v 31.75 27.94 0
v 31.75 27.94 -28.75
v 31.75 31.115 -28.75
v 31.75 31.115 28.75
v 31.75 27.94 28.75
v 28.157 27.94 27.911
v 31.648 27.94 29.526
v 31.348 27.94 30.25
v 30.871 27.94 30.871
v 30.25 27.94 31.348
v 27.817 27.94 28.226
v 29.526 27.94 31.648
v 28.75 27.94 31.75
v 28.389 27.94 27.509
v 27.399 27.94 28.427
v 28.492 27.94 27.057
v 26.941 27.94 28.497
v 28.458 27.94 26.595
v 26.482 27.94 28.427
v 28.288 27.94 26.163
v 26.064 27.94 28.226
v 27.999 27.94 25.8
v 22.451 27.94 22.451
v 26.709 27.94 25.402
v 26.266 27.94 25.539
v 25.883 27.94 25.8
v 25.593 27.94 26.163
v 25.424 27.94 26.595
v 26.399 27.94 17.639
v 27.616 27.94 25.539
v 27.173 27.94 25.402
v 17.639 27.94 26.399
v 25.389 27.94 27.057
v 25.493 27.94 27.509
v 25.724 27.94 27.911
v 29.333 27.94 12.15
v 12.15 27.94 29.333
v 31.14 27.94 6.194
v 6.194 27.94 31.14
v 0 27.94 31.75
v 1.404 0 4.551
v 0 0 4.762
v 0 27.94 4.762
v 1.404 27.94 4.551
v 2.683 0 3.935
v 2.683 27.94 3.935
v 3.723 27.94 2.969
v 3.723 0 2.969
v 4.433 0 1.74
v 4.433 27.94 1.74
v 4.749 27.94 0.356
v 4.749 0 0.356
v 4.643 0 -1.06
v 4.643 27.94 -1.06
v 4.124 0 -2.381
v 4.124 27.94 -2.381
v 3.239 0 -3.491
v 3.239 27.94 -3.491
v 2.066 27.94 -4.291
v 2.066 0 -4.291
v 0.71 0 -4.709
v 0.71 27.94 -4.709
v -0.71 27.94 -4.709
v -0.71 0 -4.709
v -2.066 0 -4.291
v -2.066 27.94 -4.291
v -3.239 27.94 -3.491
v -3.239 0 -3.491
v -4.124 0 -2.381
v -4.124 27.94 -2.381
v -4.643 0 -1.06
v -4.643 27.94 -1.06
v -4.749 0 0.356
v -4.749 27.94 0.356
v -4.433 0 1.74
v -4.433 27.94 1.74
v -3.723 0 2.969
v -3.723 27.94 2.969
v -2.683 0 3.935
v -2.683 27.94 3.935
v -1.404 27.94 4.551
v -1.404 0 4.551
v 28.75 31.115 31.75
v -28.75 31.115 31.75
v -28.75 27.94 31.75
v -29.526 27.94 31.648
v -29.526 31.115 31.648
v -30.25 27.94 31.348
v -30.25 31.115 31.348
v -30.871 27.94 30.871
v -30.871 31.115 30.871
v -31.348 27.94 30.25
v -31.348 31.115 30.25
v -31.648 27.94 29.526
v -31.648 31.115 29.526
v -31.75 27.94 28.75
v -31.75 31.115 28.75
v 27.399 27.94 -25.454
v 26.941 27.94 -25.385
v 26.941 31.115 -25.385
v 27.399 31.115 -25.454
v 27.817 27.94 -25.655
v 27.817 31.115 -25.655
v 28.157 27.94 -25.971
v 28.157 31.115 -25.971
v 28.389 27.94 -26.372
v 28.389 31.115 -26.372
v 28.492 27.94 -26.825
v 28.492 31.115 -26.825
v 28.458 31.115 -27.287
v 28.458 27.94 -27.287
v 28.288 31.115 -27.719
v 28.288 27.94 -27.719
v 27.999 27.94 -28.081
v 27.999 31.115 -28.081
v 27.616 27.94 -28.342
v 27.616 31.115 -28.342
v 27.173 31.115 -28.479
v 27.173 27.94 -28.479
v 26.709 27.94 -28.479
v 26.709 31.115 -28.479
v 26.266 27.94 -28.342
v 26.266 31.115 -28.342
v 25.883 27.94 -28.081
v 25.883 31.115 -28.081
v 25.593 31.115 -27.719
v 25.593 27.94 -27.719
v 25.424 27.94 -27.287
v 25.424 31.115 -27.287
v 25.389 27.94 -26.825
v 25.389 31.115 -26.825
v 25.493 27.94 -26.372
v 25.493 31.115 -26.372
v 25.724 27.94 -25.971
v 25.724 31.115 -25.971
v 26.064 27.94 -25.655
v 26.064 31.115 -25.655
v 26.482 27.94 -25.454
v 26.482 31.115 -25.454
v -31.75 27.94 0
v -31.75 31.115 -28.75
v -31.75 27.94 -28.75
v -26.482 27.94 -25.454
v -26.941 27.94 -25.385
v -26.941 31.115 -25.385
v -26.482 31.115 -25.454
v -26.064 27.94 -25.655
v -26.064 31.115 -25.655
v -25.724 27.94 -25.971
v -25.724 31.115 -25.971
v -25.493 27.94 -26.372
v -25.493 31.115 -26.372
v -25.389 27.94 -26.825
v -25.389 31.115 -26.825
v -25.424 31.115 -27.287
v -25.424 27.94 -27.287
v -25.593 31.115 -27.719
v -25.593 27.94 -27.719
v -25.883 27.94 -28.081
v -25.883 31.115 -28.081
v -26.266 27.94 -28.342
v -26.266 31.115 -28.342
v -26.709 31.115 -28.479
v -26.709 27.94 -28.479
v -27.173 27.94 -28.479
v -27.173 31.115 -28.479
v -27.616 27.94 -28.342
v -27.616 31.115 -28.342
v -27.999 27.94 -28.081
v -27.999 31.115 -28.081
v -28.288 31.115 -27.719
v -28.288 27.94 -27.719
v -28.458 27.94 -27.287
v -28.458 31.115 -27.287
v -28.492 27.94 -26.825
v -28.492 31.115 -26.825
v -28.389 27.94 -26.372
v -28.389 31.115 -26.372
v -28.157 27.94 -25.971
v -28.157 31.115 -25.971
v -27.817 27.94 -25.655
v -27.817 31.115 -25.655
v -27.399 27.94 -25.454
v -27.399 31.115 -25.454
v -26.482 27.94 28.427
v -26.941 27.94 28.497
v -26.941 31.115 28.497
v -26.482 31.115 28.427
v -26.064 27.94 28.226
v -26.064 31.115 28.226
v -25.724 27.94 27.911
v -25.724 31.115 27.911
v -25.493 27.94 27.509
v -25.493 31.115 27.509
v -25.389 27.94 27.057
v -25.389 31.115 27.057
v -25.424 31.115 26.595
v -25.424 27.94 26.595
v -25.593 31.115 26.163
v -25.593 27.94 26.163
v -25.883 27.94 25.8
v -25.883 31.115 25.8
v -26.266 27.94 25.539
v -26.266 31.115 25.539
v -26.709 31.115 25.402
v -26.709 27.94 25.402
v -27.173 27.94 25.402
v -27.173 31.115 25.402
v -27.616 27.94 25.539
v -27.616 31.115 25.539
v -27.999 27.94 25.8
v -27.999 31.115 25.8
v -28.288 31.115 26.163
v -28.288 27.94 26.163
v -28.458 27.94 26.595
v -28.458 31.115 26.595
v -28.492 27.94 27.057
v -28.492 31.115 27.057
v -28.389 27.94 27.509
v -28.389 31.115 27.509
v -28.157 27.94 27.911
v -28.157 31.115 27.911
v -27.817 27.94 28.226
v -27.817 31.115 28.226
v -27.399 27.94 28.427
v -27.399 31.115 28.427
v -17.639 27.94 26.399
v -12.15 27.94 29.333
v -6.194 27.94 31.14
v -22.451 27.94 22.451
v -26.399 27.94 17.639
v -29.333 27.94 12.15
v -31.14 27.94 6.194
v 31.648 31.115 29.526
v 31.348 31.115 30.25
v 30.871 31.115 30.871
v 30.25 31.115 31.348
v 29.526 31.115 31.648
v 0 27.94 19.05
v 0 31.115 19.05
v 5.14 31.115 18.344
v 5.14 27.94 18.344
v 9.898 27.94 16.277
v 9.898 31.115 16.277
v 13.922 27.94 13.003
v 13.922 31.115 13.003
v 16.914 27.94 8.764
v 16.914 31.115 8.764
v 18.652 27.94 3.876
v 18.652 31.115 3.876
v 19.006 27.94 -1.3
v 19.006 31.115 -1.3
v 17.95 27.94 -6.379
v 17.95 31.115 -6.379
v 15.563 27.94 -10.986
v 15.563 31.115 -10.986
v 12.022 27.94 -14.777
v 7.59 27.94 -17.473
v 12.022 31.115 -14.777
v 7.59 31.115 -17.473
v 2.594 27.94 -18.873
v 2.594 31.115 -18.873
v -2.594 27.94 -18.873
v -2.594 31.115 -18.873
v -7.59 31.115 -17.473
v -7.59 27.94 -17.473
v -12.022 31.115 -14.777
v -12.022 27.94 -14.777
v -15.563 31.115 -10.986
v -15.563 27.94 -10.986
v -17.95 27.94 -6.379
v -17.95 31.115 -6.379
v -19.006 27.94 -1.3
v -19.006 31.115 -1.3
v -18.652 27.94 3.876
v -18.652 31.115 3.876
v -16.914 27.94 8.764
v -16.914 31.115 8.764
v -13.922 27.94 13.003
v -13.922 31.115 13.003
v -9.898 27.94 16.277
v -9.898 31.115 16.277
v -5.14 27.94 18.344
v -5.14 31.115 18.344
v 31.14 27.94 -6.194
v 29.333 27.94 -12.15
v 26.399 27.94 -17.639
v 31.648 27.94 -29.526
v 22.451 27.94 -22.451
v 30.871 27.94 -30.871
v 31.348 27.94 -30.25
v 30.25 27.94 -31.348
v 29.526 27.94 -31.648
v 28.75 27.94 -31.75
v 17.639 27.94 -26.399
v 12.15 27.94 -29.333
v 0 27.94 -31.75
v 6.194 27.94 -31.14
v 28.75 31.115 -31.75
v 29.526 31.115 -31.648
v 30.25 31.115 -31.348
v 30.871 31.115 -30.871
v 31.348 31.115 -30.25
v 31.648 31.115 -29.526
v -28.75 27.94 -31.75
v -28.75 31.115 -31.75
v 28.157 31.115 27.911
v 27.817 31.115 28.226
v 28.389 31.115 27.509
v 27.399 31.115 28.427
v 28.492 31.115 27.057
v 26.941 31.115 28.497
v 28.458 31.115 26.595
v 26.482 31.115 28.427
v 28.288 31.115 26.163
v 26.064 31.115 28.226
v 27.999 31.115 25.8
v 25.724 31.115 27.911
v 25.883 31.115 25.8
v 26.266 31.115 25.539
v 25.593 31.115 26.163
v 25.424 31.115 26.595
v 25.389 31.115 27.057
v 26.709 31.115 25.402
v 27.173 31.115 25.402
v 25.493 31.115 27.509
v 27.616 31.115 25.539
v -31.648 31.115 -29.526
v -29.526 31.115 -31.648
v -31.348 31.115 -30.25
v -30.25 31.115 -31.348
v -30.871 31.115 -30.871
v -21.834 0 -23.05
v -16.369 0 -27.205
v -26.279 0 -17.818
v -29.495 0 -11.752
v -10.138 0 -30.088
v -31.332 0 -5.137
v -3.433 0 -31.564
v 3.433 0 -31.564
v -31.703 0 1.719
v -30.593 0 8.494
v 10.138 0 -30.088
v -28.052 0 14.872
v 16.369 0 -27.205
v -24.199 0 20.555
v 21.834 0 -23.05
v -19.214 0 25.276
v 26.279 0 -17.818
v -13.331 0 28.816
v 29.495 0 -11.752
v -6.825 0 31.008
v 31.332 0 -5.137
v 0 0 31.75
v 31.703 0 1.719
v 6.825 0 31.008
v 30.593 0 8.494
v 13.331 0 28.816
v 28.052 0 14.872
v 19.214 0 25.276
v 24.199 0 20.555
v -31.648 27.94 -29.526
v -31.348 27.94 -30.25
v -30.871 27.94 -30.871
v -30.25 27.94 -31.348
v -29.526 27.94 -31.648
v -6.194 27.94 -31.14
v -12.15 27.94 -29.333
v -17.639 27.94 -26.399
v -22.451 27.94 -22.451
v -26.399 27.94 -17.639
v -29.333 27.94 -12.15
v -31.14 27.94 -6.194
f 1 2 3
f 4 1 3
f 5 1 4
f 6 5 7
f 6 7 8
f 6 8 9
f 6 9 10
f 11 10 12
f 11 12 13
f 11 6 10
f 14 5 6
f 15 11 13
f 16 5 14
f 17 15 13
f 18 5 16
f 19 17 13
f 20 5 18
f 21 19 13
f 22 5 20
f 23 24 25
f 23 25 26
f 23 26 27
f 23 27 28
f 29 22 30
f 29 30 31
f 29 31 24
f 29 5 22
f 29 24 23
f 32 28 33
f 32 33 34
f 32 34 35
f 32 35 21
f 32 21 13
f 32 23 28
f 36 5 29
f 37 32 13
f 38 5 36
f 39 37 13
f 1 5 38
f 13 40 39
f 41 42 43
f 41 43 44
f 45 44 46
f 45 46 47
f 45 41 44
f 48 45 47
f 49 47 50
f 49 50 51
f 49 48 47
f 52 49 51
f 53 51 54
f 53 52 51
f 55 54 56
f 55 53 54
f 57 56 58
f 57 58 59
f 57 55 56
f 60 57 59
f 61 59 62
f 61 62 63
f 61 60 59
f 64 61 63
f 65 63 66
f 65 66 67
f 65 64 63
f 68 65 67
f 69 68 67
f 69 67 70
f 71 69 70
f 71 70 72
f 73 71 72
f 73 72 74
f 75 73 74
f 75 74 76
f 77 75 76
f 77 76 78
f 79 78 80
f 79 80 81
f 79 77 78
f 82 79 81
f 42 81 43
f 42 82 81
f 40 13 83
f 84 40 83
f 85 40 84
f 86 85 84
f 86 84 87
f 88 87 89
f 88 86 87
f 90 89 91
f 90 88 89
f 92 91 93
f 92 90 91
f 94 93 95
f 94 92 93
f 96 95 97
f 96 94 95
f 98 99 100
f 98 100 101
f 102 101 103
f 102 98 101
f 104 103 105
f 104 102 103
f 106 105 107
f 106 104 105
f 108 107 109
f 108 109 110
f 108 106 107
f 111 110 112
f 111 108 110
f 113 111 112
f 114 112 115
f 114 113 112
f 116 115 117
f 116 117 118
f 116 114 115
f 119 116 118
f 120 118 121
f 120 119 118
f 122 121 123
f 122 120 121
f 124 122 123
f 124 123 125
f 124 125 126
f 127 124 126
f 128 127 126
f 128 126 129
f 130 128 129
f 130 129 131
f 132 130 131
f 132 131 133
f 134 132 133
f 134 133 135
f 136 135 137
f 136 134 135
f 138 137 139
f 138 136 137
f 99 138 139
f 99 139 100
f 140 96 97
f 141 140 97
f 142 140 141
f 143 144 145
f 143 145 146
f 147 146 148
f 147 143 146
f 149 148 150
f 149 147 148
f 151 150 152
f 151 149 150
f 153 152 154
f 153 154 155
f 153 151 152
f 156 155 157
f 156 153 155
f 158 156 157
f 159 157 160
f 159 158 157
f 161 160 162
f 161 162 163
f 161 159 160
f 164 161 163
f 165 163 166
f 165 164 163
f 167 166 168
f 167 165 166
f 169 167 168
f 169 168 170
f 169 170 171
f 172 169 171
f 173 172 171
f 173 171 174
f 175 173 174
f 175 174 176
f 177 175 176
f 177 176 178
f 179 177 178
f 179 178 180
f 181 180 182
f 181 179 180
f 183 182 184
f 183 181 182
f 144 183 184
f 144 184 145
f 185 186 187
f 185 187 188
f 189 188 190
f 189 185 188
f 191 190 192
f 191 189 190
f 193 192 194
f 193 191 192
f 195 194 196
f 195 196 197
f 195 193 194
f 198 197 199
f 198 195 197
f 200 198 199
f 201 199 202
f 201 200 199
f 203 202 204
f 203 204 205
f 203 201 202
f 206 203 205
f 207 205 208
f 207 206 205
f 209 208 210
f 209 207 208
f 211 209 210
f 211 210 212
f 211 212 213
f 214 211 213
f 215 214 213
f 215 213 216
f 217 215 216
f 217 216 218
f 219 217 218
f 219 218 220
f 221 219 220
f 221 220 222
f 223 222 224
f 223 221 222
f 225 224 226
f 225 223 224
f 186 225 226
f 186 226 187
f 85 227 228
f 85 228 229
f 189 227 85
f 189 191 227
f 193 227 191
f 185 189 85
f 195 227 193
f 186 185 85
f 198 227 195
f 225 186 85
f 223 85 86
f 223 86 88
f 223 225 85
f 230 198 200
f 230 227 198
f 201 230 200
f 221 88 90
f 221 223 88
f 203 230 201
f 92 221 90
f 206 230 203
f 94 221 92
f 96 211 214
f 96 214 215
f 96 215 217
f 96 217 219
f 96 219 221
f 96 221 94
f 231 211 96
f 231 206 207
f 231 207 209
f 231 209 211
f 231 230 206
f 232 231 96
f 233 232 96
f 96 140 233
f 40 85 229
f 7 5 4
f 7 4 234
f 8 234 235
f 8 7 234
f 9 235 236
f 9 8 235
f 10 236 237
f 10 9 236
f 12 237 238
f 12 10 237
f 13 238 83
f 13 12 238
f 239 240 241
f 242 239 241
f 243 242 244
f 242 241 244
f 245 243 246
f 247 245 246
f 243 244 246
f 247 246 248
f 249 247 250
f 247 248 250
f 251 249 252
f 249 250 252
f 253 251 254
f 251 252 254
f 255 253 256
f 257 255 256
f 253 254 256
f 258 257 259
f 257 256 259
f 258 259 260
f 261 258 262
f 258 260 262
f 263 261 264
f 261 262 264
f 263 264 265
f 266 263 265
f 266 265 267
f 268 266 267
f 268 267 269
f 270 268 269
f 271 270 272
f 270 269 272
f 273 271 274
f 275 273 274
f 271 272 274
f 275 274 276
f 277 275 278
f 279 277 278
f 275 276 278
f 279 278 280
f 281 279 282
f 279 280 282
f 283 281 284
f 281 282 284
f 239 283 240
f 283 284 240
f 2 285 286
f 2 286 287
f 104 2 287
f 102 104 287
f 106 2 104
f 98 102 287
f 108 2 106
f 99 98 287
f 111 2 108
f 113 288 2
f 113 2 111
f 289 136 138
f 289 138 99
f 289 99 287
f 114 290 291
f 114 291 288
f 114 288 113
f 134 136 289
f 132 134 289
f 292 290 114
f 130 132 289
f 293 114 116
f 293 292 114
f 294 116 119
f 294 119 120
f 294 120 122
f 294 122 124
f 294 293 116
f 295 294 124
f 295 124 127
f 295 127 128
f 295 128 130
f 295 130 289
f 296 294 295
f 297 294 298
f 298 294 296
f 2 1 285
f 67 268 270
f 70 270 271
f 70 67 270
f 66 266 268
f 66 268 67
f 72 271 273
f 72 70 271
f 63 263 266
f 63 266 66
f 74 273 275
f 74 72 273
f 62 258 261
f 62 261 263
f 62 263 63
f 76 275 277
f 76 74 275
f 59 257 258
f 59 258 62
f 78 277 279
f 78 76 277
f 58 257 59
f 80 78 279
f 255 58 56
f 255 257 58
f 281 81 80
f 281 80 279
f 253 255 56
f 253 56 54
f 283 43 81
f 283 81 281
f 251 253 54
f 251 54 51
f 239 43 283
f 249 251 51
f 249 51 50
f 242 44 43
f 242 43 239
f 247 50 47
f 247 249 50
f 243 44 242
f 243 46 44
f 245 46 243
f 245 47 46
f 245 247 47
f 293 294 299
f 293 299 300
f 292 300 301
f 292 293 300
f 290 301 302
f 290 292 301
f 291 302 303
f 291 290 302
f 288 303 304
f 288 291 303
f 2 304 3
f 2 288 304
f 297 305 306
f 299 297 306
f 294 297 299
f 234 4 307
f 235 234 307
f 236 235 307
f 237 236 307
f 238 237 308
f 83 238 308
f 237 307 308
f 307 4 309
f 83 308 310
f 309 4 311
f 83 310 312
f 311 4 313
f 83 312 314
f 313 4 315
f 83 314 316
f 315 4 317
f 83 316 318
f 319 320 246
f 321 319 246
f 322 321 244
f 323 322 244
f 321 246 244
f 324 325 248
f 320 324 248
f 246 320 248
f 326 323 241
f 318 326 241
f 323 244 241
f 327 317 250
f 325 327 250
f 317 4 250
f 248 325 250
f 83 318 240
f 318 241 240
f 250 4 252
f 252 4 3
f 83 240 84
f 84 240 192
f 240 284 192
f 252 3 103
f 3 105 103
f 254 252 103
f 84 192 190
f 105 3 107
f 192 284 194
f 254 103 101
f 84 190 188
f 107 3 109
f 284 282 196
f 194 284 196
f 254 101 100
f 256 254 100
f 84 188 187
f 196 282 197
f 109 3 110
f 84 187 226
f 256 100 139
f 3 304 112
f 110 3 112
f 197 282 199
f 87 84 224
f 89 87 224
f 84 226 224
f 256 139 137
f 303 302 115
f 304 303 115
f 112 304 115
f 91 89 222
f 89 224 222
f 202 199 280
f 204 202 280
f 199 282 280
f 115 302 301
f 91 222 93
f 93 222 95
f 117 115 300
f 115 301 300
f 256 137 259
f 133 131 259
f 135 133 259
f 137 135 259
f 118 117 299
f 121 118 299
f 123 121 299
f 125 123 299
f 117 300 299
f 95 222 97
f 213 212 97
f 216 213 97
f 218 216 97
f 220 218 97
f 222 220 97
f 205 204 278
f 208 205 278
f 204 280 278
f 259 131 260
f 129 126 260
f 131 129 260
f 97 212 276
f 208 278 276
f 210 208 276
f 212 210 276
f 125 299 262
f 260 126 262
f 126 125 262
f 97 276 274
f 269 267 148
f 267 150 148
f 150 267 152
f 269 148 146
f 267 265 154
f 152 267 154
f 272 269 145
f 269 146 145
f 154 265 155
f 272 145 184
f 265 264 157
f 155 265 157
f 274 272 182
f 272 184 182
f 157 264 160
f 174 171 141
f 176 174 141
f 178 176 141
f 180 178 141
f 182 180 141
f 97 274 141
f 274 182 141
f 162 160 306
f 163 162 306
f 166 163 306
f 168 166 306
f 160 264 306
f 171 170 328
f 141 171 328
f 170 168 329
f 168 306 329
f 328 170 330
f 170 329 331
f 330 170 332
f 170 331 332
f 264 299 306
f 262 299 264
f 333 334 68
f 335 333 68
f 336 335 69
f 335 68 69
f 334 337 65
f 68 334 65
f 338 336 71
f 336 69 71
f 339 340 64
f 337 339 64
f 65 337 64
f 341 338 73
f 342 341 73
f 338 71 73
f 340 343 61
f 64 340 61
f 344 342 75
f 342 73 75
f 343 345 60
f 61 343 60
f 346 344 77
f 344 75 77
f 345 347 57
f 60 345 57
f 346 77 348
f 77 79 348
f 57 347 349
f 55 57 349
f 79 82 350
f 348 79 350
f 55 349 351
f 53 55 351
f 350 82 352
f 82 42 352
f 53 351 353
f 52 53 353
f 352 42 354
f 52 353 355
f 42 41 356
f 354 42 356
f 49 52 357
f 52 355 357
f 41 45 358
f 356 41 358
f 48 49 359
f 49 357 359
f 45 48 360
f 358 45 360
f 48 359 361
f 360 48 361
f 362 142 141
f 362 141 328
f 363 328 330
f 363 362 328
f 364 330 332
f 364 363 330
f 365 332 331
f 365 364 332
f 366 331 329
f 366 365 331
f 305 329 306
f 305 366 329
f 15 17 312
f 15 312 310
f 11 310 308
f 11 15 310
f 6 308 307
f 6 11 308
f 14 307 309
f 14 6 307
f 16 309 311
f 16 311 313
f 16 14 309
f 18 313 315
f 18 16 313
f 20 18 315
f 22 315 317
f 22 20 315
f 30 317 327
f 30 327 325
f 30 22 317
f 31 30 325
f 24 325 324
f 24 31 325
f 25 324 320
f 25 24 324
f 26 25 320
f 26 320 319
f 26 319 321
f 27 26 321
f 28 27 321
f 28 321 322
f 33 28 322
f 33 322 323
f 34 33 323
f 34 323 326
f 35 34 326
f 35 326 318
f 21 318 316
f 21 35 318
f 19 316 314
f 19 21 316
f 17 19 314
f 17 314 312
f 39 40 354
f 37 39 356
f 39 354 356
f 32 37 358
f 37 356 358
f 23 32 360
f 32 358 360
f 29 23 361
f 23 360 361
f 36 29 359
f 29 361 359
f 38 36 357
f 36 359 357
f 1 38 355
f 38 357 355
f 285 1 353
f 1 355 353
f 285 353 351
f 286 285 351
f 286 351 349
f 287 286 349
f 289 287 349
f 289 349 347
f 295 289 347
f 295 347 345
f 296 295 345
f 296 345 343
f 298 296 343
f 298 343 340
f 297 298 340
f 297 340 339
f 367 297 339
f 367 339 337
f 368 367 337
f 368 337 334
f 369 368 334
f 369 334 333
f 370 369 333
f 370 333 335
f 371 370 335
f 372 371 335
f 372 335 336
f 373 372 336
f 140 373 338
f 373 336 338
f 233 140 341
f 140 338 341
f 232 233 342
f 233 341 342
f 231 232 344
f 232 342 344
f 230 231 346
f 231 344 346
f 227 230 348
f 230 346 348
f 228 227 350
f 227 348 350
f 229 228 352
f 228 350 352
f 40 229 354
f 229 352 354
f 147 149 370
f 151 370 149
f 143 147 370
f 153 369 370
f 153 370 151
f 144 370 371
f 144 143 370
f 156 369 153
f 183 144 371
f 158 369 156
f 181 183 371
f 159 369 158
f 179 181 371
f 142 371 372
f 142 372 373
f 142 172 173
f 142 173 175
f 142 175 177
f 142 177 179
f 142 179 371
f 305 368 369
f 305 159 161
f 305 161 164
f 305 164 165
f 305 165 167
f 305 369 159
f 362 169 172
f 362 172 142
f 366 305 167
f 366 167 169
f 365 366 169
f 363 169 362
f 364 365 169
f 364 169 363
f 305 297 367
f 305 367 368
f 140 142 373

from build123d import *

# Parameters (mm, degrees)
SKETCH1_R           = 31.75
SKETCH1_R_2         = 4.7625
BOSS_EXTRUDE1_DEPTH = 27.94
SKETCH2_R           = 1.55575
BOSS_EXTRUDE2_DEPTH = 3.175
SKETCH3_R           = 19.05
CUT_EXTRUDE1_DEPTH  = 3.175


with BuildPart() as part:
    # Sketch1 → Boss-Extrude1 (new body)
    with BuildSketch(Plane(origin=(0, 0, 0), x_dir=(1, 0, 0), z_dir=(0, 1, 0))):
        with Locations(Location((0, 0, 0), (0, 0, 270))):
            Circle(SKETCH1_R)
        with Locations(Location((0, 0, 0), (0, 0, 270))):
            Circle(SKETCH1_R_2, mode=Mode.SUBTRACT)
    extrude(amount=BOSS_EXTRUDE1_DEPTH)

    # Sketch2 → Boss-Extrude2 (add)
    with BuildSketch(Plane(origin=(0, 27.94, 0), x_dir=(1, 0, 0), z_dir=(0, 1, 0))):
        with BuildLine():
            Line((-28.75, 31.75), (28.75, 31.75))
            ThreePointArc((28.75, 31.75), (30.871320344, 30.871320344), (31.75, 28.75))
            Line((31.75, 28.75), (31.75, -28.75))
            ThreePointArc((31.75, -28.75), (30.871320344, -30.871320344), (28.75, -31.75))
            Line((28.75, -31.75), (-28.75, -31.75))
            ThreePointArc((-28.75, -31.75), (-30.871320344, -30.871320344), (-31.75, -28.75))
            Line((-31.75, -28.75), (-31.75, 28.75))
            ThreePointArc((-31.75, 28.75), (-30.871320344, 30.871320344), (-28.75, 31.75))
        make_face()
        with Locations(Location((-26.940768363, 26.940768363, 0), (0, 0, 270))):
            Circle(SKETCH2_R, mode=Mode.SUBTRACT)
        with Locations(Location((26.940768363, 26.940768363, 0), (0, 0, 270))):
            Circle(SKETCH2_R, mode=Mode.SUBTRACT)
        with Locations(Location((26.940768363, -26.940768363, 0), (0, 0, 270))):
            Circle(SKETCH2_R, mode=Mode.SUBTRACT)
        with Locations(Location((-26.940768363, -26.940768363, 0), (0, 0, 270))):
            Circle(SKETCH2_R, mode=Mode.SUBTRACT)
    extrude(amount=BOSS_EXTRUDE2_DEPTH)

    # Sketch3 → Cut-Extrude1 (cut)
    with BuildSketch(Plane(origin=(0, 31.115, 0), x_dir=(1, 0, 0), z_dir=(0, 1, 0))):
        with Locations(Location((0, 0, 0), (0, 0, 270))):
            Circle(SKETCH3_R)
    extrude(amount=-CUT_EXTRUDE1_DEPTH, mode=Mode.SUBTRACT)


solid = part.part
